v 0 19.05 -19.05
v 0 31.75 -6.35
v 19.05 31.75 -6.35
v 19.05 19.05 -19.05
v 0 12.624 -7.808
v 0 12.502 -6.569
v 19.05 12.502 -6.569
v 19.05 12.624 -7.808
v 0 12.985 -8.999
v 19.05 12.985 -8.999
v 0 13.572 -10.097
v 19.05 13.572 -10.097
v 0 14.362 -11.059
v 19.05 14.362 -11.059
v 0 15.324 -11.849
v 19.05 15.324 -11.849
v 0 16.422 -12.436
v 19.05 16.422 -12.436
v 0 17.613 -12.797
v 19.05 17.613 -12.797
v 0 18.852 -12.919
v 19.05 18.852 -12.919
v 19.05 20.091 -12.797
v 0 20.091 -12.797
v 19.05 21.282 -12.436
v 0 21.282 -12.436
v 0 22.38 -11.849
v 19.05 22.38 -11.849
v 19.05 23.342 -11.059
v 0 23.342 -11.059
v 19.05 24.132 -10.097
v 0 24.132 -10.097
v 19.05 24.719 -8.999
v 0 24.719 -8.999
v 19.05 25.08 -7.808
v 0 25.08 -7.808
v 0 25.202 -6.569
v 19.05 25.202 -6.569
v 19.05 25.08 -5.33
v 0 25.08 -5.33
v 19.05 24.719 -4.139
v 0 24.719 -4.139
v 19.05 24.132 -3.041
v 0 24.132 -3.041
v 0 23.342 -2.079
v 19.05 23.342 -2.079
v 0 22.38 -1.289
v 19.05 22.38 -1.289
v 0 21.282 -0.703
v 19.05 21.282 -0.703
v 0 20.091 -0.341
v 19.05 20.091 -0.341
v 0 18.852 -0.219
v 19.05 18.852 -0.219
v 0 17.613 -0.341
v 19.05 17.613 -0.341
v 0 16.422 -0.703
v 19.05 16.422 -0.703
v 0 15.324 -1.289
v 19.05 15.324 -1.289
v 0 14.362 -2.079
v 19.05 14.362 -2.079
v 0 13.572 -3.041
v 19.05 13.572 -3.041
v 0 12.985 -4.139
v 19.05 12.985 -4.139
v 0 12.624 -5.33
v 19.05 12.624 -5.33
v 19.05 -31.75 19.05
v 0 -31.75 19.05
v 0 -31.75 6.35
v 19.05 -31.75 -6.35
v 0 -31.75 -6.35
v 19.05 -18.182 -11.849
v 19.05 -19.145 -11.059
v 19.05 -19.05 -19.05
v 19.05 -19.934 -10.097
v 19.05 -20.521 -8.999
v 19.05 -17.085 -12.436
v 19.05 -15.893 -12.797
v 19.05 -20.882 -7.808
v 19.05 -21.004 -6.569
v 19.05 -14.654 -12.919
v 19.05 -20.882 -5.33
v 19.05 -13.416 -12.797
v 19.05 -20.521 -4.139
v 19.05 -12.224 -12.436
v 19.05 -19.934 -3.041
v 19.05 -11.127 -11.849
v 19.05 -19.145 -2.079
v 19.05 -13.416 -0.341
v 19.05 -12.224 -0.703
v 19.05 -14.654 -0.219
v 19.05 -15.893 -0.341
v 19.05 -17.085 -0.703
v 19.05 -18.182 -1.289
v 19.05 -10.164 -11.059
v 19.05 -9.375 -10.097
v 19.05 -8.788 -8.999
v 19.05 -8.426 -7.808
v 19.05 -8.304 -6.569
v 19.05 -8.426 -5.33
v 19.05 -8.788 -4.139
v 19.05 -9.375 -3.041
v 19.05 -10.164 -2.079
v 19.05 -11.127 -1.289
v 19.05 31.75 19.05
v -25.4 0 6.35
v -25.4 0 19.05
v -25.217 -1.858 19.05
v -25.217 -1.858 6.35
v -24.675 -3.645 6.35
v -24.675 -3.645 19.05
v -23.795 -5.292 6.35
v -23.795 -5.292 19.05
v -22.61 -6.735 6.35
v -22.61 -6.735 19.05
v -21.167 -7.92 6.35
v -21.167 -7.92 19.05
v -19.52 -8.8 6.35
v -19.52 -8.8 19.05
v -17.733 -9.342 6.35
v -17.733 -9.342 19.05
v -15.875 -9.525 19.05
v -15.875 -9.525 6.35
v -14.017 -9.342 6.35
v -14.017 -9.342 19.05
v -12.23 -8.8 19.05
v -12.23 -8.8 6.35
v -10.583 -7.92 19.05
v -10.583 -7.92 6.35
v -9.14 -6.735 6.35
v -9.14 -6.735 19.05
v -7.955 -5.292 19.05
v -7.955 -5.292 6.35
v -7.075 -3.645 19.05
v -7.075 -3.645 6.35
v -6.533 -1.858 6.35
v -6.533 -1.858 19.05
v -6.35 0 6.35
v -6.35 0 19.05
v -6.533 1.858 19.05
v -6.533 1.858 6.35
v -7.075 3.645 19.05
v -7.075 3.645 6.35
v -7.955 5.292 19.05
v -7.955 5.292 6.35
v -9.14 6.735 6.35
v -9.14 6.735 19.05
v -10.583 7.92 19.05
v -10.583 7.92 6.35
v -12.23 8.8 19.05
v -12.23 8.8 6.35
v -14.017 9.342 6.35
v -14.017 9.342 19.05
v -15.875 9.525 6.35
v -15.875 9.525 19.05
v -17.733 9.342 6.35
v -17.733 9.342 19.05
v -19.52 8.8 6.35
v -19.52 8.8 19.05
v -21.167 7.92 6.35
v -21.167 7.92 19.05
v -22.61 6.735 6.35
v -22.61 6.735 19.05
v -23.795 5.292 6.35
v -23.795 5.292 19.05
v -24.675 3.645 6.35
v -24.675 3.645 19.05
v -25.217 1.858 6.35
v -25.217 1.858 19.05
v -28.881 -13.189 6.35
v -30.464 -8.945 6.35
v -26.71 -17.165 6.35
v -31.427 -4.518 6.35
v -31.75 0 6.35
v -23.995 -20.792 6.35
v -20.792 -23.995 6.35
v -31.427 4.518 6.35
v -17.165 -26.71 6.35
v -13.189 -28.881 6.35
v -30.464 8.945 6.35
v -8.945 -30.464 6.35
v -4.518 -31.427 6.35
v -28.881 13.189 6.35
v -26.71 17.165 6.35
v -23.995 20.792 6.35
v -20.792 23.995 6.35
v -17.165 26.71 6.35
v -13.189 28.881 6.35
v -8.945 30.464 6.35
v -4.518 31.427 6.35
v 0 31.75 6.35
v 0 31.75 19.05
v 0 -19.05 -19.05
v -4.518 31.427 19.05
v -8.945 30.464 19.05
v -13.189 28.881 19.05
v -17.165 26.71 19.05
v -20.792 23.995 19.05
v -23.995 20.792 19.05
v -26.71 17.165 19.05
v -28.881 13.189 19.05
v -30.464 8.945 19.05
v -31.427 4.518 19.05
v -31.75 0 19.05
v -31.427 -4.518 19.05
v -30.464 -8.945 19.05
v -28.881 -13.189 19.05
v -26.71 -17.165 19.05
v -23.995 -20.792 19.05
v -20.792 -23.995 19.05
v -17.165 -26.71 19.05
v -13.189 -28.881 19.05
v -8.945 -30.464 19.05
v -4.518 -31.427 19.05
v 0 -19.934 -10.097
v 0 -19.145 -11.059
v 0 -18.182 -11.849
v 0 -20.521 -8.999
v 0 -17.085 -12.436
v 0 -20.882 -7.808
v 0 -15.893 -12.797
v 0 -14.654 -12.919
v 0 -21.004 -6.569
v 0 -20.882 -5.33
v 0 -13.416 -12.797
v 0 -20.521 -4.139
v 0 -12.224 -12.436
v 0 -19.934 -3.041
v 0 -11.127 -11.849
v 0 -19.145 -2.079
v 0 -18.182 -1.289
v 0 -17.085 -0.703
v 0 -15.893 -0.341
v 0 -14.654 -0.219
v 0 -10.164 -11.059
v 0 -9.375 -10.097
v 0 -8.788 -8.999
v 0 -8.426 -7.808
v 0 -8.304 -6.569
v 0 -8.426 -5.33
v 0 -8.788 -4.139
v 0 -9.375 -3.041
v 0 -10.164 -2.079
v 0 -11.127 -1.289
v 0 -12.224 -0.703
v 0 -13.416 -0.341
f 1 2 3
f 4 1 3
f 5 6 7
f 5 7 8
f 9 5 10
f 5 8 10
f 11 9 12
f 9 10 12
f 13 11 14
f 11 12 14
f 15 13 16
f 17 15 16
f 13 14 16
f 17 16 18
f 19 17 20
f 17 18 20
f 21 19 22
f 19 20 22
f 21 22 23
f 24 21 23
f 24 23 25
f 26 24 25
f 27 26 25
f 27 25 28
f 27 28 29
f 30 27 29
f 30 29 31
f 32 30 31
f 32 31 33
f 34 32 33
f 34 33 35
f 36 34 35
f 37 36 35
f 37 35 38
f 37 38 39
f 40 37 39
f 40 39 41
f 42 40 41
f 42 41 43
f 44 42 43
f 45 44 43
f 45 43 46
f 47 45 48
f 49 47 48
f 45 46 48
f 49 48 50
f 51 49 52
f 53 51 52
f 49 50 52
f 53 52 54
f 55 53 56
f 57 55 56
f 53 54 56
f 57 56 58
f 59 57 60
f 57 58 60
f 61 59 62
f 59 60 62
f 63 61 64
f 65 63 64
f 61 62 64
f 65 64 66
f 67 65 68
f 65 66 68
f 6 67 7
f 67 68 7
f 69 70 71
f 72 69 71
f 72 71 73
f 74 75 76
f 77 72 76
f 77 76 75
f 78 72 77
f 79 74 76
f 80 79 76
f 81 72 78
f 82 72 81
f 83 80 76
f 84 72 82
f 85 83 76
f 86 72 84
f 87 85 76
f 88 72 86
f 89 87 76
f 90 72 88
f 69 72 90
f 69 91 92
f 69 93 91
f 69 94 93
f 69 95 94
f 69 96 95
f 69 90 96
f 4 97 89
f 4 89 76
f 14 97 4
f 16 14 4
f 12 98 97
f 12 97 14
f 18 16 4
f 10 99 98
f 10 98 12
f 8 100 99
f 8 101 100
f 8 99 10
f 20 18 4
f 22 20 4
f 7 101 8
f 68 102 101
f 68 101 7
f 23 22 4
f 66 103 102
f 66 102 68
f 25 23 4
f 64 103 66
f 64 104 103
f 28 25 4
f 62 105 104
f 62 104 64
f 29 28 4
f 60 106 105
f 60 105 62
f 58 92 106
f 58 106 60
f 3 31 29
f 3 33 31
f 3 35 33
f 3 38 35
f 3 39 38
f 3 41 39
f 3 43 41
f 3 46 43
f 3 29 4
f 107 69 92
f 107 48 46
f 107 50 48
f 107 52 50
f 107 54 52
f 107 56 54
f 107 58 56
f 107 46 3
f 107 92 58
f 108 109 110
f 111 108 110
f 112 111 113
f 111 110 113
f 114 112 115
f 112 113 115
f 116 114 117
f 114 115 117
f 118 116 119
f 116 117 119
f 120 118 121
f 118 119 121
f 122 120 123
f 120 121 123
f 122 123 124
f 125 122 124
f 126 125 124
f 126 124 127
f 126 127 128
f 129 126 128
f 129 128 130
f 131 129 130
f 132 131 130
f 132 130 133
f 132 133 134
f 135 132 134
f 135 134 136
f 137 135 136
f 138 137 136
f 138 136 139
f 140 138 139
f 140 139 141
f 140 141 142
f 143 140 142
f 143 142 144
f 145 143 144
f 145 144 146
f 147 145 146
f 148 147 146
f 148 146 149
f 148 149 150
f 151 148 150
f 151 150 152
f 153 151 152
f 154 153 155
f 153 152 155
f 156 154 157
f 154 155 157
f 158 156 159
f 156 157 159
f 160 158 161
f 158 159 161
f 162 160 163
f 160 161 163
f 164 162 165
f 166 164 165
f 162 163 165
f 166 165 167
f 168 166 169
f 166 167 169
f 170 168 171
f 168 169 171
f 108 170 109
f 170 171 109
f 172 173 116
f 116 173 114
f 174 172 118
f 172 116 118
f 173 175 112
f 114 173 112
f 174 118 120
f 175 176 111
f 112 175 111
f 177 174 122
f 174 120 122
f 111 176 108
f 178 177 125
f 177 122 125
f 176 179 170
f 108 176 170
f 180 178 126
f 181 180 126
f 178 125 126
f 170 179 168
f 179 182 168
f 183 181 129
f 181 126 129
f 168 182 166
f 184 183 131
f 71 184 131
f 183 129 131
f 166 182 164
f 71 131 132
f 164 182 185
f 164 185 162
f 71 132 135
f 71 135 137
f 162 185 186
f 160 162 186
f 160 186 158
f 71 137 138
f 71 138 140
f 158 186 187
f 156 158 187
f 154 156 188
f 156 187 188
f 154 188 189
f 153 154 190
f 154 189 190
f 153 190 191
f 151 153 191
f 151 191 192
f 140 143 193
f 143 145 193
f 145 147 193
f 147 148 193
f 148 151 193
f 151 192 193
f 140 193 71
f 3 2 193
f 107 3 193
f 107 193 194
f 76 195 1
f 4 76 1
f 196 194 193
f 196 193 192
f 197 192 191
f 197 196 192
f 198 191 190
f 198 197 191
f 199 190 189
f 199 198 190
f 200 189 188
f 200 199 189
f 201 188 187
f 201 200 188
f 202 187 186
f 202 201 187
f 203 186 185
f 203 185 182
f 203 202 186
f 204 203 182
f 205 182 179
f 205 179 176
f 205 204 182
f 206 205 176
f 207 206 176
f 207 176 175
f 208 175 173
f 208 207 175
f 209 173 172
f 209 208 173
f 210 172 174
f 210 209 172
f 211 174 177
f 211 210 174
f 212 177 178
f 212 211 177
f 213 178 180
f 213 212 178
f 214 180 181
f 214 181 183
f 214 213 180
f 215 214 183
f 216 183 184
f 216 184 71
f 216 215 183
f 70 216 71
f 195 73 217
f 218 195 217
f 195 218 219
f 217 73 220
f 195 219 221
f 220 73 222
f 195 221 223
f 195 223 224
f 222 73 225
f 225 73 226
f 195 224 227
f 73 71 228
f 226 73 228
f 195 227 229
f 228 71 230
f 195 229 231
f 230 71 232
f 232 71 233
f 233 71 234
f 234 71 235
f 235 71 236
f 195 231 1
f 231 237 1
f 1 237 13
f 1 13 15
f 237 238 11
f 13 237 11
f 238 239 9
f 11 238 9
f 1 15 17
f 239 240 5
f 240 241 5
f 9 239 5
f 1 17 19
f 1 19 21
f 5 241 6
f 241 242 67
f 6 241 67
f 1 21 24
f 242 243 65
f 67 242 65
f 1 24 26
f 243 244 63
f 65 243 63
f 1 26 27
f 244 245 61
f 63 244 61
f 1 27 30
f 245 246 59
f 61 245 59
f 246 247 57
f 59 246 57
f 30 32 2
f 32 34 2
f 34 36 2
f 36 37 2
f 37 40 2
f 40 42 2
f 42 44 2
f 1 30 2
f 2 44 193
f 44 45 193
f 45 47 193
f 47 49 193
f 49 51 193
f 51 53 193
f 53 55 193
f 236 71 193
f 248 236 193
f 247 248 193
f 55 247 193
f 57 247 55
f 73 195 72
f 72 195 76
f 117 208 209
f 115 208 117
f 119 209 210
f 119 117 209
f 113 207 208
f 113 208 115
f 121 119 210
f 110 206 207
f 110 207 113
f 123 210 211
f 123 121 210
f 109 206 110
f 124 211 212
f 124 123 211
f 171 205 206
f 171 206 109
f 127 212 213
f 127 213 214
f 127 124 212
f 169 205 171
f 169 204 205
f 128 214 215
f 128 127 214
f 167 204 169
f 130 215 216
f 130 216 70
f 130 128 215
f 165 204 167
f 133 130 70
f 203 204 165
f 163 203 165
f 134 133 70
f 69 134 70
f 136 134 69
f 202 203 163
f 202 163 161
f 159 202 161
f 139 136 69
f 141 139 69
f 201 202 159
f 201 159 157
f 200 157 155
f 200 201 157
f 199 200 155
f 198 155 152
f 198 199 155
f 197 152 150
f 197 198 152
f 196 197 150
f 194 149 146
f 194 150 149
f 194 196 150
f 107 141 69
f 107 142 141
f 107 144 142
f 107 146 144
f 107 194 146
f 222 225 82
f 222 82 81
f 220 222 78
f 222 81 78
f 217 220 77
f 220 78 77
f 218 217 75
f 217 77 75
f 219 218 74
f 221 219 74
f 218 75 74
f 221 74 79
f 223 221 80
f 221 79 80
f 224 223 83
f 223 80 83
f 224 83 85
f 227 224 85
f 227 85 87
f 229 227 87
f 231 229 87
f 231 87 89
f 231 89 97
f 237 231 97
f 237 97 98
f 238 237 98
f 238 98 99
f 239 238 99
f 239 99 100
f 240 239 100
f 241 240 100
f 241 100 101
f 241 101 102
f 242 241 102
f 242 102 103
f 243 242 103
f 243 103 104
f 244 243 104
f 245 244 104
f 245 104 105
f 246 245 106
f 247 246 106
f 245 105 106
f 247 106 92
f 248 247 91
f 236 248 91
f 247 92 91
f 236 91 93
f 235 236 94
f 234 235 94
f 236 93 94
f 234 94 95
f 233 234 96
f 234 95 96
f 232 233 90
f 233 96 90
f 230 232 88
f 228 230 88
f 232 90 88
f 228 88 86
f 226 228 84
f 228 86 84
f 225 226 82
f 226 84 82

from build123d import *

# Parameters (mm, degrees)
F1_DEPTH = 19.05
F2_SIZE  = 12.7
F3_SIZE  = 12.7
F4_D     = 12.7
F6_DEPTH = 12.7
F8_D     = 19.05


with BuildPart() as f1:
    # F0 (on Right) → F1 (new body)
    with BuildSketch(Plane.YZ):
        Polygon((-31.75, 19.05), (-31.75, -19.05), (31.75, -19.05), (31.75, 19.05), (0, 19.05), align=None)
    extrude(amount=F1_DEPTH)

    # F2
    f2_edges = [f1.edges().sort_by_distance(p)[0] for p in [
        (9.525, -31.75, -19.05),
    ]]
    chamfer(f2_edges, length=F2_SIZE)

    # F3
    f3_edges = [f1.edges().sort_by_distance(p)[0] for p in [
        (9.525, 31.75, -19.05),
    ]]
    chamfer(f3_edges, length=F3_SIZE)

    # F4 (through all)
    with Locations(Plane(origin=(0, 0, 0), x_dir=(0, 1, 0), z_dir=(-1, 0, 0))):
        with Locations((-14.6544640884, 6.5692421049), (18.8520774245, 6.5692421049)):
            Hole(F4_D / 2)

    # F5 (on face) → F6 (join)
    with BuildSketch(Plane.XY.offset(19.05)):
        with BuildLine():
            Line((0, -31.75), (0, 0))
            Line((0, 0), (-31.75, 0))
            ThreePointArc((-31.75, 0), (-22.4506403027, -22.4506403027), (0, -31.75))
        make_face()
        with BuildLine():
            Line((-31.75, 0), (0, 0))
            Line((0, 0), (0, 31.75))
            ThreePointArc((0, 31.75), (-22.4506403027, 22.4506403027), (-31.75, 0))
        make_face()
    extrude(amount=-F6_DEPTH)

    # F8 (through all)
    with Locations(Plane(origin=(0, 0, 0), x_dir=(1, 0, 0), z_dir=(0, 0, -1))):
        with Locations((-15.875, 0)):
            Hole(F8_D / 2)


solid = f1.part
